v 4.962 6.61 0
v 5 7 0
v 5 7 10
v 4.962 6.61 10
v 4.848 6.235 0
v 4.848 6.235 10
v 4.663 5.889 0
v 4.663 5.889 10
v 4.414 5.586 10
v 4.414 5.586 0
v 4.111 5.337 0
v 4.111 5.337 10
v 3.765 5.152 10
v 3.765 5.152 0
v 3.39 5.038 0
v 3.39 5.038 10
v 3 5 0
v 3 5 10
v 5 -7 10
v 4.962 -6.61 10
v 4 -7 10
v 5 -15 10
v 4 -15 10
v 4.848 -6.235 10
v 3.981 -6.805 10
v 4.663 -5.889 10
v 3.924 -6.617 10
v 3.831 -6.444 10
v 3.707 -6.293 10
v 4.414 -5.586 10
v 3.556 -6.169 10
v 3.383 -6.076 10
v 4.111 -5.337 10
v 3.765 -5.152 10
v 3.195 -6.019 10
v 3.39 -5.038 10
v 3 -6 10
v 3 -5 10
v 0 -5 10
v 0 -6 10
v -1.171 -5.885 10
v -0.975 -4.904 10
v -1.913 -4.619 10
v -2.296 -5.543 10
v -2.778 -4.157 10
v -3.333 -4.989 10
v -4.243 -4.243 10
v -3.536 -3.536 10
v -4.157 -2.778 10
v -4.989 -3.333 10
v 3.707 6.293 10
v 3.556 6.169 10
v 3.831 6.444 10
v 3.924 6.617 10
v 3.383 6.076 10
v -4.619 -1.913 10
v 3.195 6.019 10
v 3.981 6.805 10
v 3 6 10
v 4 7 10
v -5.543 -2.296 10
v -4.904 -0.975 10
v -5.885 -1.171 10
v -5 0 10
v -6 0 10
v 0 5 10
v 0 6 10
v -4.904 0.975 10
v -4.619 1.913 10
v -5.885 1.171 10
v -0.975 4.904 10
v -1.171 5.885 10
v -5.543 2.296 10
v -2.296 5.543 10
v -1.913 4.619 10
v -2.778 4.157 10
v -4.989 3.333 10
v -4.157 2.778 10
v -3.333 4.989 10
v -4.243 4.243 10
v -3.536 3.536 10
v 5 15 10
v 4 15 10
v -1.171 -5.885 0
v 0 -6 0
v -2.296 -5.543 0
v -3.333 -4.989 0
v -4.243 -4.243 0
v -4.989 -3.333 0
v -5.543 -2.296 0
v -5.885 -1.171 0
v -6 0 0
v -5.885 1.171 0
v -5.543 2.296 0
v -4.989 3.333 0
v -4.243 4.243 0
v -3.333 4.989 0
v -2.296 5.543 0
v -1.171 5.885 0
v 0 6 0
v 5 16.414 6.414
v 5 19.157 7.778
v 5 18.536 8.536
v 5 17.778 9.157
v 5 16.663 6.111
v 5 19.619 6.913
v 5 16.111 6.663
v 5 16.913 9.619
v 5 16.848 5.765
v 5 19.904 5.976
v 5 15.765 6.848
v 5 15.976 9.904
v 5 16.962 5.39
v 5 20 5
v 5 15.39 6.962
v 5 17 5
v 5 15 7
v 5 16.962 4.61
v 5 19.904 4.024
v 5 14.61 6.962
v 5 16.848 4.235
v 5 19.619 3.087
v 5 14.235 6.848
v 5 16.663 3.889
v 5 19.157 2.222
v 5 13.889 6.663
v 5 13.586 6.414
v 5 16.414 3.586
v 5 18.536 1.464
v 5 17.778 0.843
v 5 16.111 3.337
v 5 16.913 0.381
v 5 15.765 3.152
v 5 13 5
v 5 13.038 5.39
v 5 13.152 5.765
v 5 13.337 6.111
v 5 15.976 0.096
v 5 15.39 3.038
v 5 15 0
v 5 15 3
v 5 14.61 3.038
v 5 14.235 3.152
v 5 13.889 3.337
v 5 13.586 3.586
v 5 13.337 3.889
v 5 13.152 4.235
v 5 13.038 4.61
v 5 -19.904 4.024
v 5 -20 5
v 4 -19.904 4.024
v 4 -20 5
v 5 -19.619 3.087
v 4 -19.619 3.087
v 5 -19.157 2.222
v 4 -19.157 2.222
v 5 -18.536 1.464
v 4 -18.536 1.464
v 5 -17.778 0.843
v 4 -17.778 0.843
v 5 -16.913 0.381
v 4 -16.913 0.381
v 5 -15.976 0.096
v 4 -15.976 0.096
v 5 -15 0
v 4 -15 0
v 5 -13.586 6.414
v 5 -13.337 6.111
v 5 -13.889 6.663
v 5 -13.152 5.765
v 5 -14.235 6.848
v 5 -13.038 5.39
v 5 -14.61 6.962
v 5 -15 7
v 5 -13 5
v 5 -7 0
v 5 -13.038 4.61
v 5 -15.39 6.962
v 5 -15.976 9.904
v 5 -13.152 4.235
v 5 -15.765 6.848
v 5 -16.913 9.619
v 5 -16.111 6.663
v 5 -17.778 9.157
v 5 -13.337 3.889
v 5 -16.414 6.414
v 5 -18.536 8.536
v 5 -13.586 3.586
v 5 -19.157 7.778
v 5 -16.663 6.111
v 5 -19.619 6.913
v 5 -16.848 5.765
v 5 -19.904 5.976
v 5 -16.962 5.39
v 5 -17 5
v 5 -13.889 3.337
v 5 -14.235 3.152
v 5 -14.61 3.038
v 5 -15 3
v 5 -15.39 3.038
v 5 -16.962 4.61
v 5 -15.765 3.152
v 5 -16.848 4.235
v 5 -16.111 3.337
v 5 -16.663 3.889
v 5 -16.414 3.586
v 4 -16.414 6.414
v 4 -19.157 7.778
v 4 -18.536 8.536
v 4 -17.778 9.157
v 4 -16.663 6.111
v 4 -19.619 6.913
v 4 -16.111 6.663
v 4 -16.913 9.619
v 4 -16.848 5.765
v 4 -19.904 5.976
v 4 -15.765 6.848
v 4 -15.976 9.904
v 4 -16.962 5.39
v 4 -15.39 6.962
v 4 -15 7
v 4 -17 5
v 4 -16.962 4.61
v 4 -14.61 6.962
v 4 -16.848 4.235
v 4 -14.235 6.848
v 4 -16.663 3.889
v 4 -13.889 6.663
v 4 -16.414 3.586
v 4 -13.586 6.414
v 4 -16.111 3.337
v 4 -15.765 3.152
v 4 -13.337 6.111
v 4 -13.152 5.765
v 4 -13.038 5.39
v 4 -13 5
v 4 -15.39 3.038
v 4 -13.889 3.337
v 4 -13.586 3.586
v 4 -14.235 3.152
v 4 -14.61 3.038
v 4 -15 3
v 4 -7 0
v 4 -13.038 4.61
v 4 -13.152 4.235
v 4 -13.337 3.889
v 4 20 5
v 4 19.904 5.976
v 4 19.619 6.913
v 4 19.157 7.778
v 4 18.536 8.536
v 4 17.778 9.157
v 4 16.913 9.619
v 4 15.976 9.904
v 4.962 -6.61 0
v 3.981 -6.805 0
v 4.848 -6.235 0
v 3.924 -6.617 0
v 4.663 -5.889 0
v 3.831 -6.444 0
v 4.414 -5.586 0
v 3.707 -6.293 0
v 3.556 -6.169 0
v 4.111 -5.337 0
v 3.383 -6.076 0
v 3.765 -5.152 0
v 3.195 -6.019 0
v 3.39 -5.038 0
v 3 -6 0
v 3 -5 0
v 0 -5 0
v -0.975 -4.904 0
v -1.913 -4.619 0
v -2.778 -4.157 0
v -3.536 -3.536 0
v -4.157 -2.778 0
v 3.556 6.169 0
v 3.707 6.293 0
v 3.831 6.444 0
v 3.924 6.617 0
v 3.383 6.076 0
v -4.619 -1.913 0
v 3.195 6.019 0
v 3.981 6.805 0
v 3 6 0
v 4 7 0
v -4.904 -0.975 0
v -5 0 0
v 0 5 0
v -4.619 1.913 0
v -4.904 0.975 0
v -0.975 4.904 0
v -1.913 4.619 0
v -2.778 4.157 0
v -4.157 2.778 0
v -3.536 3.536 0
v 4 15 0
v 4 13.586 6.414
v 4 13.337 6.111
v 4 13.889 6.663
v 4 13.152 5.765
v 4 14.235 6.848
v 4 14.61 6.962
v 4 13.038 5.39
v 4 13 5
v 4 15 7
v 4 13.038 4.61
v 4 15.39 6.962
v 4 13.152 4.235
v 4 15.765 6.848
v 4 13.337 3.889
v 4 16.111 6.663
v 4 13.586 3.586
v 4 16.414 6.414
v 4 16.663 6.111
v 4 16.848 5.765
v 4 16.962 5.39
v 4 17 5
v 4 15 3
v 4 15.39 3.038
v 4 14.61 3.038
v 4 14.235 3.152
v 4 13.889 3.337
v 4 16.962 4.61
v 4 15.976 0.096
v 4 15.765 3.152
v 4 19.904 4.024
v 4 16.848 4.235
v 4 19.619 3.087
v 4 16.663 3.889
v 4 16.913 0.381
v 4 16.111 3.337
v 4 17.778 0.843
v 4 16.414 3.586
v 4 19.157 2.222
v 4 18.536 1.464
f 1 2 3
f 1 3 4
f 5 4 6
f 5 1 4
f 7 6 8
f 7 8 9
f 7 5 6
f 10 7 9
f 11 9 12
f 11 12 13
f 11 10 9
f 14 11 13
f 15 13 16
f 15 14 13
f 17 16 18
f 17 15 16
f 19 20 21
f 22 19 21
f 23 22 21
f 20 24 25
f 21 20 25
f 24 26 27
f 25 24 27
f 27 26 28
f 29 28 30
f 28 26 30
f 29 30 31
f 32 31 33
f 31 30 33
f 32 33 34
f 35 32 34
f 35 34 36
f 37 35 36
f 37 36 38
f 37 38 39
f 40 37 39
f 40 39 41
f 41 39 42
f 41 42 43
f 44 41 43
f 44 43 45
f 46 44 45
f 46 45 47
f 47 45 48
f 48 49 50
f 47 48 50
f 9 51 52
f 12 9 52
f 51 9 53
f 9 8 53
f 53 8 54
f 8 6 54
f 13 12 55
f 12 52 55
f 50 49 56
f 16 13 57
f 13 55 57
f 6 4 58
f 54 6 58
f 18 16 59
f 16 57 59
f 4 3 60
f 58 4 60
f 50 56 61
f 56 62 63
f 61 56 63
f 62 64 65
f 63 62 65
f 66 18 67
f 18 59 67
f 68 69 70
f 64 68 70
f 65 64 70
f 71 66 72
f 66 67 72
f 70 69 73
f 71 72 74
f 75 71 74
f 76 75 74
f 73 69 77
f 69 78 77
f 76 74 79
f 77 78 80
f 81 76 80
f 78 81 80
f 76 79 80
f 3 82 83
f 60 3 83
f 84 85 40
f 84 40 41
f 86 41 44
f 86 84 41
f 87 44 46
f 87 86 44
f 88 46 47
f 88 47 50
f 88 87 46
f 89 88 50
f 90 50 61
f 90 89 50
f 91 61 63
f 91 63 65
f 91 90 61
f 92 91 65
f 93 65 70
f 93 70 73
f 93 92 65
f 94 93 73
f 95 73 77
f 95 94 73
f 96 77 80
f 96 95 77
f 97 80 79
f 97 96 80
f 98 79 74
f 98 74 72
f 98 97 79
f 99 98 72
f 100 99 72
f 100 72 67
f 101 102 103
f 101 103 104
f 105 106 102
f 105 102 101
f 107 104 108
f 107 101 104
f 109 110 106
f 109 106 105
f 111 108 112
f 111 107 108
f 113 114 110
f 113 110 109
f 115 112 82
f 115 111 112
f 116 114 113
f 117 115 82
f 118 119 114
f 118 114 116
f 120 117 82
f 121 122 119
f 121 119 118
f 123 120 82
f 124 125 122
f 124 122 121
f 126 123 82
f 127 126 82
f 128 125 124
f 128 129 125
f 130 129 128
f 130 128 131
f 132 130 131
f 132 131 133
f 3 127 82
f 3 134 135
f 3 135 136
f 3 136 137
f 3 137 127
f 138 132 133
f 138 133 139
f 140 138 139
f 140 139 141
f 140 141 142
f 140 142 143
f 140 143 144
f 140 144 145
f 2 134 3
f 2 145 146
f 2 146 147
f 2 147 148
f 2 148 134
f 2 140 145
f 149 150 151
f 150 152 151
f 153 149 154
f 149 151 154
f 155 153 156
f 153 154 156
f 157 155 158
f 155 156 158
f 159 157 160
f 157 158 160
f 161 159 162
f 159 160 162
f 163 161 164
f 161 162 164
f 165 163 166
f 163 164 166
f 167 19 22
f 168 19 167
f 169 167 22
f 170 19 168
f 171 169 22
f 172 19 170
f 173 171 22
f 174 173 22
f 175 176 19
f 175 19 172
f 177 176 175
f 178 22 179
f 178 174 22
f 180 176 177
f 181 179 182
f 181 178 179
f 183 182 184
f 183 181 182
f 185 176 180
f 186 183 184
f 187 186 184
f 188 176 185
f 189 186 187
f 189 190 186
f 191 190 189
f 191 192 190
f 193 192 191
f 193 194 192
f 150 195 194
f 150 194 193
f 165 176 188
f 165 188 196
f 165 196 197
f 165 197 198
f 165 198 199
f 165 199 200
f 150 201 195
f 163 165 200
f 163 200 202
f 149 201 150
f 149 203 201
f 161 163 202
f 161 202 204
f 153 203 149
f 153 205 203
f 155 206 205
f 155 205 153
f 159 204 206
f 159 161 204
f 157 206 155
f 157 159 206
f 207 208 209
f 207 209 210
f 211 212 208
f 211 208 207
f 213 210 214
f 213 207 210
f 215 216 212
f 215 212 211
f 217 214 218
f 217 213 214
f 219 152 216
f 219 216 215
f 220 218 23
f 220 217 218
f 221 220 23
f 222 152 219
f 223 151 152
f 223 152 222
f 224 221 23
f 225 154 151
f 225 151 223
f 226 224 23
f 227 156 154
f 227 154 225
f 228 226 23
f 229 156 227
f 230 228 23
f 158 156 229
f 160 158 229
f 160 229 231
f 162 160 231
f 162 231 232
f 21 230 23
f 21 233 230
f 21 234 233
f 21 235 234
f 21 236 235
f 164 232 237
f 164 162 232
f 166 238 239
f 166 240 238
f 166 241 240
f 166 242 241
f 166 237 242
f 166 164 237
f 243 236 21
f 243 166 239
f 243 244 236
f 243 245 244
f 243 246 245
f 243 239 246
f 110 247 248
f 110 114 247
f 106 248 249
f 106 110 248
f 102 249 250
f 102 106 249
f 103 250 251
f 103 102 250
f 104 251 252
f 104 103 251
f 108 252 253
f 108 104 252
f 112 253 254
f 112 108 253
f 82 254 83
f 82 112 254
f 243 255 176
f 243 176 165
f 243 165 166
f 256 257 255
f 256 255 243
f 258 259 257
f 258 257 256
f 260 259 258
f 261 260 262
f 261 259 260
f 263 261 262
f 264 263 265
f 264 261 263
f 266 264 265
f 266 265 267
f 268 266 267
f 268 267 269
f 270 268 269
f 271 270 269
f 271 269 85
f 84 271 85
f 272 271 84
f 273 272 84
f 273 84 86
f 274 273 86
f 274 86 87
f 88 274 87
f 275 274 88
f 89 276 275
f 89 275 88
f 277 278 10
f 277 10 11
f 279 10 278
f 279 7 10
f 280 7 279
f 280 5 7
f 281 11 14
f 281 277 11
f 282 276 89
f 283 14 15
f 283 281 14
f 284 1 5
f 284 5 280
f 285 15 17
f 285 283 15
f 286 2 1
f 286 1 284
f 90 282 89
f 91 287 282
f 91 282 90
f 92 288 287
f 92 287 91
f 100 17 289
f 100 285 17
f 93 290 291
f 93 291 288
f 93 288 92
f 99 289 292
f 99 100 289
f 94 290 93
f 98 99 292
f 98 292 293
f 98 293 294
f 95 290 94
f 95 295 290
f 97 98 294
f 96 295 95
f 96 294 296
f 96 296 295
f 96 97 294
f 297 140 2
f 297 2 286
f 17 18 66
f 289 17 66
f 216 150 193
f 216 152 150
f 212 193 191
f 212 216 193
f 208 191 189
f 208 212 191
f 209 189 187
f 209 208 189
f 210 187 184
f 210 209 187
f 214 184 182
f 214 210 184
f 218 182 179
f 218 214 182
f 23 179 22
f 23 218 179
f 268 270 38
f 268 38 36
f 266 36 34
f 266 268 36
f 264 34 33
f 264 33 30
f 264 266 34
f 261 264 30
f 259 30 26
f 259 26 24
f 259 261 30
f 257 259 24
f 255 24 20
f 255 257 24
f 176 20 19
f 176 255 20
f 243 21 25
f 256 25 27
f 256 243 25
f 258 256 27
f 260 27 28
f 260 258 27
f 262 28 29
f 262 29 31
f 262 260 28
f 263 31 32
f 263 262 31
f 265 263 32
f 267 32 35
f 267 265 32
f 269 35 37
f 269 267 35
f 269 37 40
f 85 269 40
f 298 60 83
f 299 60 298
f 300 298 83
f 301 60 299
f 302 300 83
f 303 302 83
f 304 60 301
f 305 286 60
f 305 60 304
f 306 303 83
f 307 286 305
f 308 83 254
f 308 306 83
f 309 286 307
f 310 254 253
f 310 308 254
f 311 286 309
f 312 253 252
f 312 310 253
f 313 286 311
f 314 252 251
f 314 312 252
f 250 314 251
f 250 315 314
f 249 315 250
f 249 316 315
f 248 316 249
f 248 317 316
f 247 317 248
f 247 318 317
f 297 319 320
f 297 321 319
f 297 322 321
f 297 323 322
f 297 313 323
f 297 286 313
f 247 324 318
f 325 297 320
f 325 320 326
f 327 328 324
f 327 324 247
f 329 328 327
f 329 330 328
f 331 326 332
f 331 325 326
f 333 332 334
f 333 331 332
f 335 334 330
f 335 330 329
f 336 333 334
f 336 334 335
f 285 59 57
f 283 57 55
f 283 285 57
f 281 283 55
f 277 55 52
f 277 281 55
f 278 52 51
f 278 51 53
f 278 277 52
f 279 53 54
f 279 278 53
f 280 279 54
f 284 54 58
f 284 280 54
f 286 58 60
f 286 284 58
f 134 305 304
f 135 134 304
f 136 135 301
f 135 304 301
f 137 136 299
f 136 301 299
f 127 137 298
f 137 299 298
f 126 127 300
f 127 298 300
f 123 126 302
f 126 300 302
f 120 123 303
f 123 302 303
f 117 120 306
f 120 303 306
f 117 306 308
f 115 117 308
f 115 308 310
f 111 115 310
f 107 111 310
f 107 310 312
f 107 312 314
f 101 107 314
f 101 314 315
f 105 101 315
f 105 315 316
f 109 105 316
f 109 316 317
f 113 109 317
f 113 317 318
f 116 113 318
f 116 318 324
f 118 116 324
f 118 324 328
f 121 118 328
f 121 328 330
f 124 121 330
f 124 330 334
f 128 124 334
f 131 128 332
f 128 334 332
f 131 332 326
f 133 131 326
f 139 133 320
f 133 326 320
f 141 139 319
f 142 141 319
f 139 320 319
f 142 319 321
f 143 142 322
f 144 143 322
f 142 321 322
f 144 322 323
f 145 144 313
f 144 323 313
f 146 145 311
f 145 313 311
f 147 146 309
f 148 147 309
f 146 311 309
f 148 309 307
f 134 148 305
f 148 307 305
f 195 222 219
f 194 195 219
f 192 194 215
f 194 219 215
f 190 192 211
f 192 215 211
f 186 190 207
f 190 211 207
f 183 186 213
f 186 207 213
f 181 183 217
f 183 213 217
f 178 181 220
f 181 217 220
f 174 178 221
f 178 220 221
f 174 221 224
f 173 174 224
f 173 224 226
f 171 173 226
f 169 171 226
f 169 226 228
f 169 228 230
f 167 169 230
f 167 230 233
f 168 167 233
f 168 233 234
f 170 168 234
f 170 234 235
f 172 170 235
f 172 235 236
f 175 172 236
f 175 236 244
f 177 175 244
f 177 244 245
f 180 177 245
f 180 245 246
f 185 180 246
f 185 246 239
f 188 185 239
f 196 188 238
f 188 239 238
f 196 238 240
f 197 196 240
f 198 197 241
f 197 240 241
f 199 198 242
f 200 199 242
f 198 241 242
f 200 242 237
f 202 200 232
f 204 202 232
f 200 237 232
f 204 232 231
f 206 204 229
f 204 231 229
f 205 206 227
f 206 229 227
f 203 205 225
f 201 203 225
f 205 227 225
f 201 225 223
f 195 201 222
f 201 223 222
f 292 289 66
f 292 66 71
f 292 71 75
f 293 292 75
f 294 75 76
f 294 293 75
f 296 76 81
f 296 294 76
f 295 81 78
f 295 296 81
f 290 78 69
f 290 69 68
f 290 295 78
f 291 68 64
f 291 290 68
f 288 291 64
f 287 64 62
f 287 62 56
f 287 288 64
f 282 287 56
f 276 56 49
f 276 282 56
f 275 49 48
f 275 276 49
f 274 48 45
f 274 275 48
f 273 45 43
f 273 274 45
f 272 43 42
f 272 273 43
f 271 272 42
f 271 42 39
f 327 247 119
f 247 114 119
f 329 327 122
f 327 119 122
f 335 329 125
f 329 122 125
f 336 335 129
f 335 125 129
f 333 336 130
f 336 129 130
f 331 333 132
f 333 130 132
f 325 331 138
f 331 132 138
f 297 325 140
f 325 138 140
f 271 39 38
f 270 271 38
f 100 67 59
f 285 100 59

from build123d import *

# Parameters (mm, degrees)
EXTRUDE_1_DEPTH     = 10
FILLET_1_R          = 5
SKETCH_2_R          = 2
CUT_EXTRUDE_1_DEPTH = 25.494897428


with BuildPart() as part:
    # 草图1 → 拉伸-薄壁1 (new body)
    with BuildSketch(Plane.XY):
        with BuildLine():
            Line((5, 20), (5, 7))
            ThreePointArc((5, 7), (4.414213562, 5.585786438), (3, 5))
            Line((3, 5), (0, 5))
            ThreePointArc((0, 5), (-5, 0), (0, -5))
            Line((0, -5), (3, -5))
            ThreePointArc((3, -5), (4.414213562, -5.585786438), (5, -7))
            Line((5, -7), (5, -20))
            Line((5, -20), (4, -20))
            Line((4, -20), (4, -7))
            ThreePointArc((4, -7), (3.707106781, -6.292893219), (3, -6))
            Line((3, -6), (0, -6))
            ThreePointArc((0, -6), (-6, 0), (0, 6))
            Line((0, 6), (3, 6))
            ThreePointArc((3, 6), (3.707106781, 6.292893219), (4, 7))
            Line((4, 7), (4, 20))
            Line((4, 20), (5, 20))
        make_face()
    extrude(amount=EXTRUDE_1_DEPTH)

    # 圆角1
    fillet_1_edges = [part.edges().sort_by_distance(p)[0] for p in [
        (4.5, 20, 10),
        (4.5, 20, 0),
        (4.5, -20, 10),
        (4.5, -20, 0),
    ]]
    fillet(fillet_1_edges, radius=FILLET_1_R - 0.0001)  # a hair under: the kernel refuses the full size

    # 草图2 → 切除-拉伸1 (cut, through all)
    with BuildSketch(Plane.ZY.offset(-4)):
        with Locations(Location((5, -15, 0), (0, 0, 270))):
            Circle(SKETCH_2_R)
        with Locations(Location((5, 15, 0), (0, 0, 270))):
            Circle(SKETCH_2_R)
    extrude(amount=-CUT_EXTRUDE_1_DEPTH, mode=Mode.SUBTRACT)


solid = part.part
